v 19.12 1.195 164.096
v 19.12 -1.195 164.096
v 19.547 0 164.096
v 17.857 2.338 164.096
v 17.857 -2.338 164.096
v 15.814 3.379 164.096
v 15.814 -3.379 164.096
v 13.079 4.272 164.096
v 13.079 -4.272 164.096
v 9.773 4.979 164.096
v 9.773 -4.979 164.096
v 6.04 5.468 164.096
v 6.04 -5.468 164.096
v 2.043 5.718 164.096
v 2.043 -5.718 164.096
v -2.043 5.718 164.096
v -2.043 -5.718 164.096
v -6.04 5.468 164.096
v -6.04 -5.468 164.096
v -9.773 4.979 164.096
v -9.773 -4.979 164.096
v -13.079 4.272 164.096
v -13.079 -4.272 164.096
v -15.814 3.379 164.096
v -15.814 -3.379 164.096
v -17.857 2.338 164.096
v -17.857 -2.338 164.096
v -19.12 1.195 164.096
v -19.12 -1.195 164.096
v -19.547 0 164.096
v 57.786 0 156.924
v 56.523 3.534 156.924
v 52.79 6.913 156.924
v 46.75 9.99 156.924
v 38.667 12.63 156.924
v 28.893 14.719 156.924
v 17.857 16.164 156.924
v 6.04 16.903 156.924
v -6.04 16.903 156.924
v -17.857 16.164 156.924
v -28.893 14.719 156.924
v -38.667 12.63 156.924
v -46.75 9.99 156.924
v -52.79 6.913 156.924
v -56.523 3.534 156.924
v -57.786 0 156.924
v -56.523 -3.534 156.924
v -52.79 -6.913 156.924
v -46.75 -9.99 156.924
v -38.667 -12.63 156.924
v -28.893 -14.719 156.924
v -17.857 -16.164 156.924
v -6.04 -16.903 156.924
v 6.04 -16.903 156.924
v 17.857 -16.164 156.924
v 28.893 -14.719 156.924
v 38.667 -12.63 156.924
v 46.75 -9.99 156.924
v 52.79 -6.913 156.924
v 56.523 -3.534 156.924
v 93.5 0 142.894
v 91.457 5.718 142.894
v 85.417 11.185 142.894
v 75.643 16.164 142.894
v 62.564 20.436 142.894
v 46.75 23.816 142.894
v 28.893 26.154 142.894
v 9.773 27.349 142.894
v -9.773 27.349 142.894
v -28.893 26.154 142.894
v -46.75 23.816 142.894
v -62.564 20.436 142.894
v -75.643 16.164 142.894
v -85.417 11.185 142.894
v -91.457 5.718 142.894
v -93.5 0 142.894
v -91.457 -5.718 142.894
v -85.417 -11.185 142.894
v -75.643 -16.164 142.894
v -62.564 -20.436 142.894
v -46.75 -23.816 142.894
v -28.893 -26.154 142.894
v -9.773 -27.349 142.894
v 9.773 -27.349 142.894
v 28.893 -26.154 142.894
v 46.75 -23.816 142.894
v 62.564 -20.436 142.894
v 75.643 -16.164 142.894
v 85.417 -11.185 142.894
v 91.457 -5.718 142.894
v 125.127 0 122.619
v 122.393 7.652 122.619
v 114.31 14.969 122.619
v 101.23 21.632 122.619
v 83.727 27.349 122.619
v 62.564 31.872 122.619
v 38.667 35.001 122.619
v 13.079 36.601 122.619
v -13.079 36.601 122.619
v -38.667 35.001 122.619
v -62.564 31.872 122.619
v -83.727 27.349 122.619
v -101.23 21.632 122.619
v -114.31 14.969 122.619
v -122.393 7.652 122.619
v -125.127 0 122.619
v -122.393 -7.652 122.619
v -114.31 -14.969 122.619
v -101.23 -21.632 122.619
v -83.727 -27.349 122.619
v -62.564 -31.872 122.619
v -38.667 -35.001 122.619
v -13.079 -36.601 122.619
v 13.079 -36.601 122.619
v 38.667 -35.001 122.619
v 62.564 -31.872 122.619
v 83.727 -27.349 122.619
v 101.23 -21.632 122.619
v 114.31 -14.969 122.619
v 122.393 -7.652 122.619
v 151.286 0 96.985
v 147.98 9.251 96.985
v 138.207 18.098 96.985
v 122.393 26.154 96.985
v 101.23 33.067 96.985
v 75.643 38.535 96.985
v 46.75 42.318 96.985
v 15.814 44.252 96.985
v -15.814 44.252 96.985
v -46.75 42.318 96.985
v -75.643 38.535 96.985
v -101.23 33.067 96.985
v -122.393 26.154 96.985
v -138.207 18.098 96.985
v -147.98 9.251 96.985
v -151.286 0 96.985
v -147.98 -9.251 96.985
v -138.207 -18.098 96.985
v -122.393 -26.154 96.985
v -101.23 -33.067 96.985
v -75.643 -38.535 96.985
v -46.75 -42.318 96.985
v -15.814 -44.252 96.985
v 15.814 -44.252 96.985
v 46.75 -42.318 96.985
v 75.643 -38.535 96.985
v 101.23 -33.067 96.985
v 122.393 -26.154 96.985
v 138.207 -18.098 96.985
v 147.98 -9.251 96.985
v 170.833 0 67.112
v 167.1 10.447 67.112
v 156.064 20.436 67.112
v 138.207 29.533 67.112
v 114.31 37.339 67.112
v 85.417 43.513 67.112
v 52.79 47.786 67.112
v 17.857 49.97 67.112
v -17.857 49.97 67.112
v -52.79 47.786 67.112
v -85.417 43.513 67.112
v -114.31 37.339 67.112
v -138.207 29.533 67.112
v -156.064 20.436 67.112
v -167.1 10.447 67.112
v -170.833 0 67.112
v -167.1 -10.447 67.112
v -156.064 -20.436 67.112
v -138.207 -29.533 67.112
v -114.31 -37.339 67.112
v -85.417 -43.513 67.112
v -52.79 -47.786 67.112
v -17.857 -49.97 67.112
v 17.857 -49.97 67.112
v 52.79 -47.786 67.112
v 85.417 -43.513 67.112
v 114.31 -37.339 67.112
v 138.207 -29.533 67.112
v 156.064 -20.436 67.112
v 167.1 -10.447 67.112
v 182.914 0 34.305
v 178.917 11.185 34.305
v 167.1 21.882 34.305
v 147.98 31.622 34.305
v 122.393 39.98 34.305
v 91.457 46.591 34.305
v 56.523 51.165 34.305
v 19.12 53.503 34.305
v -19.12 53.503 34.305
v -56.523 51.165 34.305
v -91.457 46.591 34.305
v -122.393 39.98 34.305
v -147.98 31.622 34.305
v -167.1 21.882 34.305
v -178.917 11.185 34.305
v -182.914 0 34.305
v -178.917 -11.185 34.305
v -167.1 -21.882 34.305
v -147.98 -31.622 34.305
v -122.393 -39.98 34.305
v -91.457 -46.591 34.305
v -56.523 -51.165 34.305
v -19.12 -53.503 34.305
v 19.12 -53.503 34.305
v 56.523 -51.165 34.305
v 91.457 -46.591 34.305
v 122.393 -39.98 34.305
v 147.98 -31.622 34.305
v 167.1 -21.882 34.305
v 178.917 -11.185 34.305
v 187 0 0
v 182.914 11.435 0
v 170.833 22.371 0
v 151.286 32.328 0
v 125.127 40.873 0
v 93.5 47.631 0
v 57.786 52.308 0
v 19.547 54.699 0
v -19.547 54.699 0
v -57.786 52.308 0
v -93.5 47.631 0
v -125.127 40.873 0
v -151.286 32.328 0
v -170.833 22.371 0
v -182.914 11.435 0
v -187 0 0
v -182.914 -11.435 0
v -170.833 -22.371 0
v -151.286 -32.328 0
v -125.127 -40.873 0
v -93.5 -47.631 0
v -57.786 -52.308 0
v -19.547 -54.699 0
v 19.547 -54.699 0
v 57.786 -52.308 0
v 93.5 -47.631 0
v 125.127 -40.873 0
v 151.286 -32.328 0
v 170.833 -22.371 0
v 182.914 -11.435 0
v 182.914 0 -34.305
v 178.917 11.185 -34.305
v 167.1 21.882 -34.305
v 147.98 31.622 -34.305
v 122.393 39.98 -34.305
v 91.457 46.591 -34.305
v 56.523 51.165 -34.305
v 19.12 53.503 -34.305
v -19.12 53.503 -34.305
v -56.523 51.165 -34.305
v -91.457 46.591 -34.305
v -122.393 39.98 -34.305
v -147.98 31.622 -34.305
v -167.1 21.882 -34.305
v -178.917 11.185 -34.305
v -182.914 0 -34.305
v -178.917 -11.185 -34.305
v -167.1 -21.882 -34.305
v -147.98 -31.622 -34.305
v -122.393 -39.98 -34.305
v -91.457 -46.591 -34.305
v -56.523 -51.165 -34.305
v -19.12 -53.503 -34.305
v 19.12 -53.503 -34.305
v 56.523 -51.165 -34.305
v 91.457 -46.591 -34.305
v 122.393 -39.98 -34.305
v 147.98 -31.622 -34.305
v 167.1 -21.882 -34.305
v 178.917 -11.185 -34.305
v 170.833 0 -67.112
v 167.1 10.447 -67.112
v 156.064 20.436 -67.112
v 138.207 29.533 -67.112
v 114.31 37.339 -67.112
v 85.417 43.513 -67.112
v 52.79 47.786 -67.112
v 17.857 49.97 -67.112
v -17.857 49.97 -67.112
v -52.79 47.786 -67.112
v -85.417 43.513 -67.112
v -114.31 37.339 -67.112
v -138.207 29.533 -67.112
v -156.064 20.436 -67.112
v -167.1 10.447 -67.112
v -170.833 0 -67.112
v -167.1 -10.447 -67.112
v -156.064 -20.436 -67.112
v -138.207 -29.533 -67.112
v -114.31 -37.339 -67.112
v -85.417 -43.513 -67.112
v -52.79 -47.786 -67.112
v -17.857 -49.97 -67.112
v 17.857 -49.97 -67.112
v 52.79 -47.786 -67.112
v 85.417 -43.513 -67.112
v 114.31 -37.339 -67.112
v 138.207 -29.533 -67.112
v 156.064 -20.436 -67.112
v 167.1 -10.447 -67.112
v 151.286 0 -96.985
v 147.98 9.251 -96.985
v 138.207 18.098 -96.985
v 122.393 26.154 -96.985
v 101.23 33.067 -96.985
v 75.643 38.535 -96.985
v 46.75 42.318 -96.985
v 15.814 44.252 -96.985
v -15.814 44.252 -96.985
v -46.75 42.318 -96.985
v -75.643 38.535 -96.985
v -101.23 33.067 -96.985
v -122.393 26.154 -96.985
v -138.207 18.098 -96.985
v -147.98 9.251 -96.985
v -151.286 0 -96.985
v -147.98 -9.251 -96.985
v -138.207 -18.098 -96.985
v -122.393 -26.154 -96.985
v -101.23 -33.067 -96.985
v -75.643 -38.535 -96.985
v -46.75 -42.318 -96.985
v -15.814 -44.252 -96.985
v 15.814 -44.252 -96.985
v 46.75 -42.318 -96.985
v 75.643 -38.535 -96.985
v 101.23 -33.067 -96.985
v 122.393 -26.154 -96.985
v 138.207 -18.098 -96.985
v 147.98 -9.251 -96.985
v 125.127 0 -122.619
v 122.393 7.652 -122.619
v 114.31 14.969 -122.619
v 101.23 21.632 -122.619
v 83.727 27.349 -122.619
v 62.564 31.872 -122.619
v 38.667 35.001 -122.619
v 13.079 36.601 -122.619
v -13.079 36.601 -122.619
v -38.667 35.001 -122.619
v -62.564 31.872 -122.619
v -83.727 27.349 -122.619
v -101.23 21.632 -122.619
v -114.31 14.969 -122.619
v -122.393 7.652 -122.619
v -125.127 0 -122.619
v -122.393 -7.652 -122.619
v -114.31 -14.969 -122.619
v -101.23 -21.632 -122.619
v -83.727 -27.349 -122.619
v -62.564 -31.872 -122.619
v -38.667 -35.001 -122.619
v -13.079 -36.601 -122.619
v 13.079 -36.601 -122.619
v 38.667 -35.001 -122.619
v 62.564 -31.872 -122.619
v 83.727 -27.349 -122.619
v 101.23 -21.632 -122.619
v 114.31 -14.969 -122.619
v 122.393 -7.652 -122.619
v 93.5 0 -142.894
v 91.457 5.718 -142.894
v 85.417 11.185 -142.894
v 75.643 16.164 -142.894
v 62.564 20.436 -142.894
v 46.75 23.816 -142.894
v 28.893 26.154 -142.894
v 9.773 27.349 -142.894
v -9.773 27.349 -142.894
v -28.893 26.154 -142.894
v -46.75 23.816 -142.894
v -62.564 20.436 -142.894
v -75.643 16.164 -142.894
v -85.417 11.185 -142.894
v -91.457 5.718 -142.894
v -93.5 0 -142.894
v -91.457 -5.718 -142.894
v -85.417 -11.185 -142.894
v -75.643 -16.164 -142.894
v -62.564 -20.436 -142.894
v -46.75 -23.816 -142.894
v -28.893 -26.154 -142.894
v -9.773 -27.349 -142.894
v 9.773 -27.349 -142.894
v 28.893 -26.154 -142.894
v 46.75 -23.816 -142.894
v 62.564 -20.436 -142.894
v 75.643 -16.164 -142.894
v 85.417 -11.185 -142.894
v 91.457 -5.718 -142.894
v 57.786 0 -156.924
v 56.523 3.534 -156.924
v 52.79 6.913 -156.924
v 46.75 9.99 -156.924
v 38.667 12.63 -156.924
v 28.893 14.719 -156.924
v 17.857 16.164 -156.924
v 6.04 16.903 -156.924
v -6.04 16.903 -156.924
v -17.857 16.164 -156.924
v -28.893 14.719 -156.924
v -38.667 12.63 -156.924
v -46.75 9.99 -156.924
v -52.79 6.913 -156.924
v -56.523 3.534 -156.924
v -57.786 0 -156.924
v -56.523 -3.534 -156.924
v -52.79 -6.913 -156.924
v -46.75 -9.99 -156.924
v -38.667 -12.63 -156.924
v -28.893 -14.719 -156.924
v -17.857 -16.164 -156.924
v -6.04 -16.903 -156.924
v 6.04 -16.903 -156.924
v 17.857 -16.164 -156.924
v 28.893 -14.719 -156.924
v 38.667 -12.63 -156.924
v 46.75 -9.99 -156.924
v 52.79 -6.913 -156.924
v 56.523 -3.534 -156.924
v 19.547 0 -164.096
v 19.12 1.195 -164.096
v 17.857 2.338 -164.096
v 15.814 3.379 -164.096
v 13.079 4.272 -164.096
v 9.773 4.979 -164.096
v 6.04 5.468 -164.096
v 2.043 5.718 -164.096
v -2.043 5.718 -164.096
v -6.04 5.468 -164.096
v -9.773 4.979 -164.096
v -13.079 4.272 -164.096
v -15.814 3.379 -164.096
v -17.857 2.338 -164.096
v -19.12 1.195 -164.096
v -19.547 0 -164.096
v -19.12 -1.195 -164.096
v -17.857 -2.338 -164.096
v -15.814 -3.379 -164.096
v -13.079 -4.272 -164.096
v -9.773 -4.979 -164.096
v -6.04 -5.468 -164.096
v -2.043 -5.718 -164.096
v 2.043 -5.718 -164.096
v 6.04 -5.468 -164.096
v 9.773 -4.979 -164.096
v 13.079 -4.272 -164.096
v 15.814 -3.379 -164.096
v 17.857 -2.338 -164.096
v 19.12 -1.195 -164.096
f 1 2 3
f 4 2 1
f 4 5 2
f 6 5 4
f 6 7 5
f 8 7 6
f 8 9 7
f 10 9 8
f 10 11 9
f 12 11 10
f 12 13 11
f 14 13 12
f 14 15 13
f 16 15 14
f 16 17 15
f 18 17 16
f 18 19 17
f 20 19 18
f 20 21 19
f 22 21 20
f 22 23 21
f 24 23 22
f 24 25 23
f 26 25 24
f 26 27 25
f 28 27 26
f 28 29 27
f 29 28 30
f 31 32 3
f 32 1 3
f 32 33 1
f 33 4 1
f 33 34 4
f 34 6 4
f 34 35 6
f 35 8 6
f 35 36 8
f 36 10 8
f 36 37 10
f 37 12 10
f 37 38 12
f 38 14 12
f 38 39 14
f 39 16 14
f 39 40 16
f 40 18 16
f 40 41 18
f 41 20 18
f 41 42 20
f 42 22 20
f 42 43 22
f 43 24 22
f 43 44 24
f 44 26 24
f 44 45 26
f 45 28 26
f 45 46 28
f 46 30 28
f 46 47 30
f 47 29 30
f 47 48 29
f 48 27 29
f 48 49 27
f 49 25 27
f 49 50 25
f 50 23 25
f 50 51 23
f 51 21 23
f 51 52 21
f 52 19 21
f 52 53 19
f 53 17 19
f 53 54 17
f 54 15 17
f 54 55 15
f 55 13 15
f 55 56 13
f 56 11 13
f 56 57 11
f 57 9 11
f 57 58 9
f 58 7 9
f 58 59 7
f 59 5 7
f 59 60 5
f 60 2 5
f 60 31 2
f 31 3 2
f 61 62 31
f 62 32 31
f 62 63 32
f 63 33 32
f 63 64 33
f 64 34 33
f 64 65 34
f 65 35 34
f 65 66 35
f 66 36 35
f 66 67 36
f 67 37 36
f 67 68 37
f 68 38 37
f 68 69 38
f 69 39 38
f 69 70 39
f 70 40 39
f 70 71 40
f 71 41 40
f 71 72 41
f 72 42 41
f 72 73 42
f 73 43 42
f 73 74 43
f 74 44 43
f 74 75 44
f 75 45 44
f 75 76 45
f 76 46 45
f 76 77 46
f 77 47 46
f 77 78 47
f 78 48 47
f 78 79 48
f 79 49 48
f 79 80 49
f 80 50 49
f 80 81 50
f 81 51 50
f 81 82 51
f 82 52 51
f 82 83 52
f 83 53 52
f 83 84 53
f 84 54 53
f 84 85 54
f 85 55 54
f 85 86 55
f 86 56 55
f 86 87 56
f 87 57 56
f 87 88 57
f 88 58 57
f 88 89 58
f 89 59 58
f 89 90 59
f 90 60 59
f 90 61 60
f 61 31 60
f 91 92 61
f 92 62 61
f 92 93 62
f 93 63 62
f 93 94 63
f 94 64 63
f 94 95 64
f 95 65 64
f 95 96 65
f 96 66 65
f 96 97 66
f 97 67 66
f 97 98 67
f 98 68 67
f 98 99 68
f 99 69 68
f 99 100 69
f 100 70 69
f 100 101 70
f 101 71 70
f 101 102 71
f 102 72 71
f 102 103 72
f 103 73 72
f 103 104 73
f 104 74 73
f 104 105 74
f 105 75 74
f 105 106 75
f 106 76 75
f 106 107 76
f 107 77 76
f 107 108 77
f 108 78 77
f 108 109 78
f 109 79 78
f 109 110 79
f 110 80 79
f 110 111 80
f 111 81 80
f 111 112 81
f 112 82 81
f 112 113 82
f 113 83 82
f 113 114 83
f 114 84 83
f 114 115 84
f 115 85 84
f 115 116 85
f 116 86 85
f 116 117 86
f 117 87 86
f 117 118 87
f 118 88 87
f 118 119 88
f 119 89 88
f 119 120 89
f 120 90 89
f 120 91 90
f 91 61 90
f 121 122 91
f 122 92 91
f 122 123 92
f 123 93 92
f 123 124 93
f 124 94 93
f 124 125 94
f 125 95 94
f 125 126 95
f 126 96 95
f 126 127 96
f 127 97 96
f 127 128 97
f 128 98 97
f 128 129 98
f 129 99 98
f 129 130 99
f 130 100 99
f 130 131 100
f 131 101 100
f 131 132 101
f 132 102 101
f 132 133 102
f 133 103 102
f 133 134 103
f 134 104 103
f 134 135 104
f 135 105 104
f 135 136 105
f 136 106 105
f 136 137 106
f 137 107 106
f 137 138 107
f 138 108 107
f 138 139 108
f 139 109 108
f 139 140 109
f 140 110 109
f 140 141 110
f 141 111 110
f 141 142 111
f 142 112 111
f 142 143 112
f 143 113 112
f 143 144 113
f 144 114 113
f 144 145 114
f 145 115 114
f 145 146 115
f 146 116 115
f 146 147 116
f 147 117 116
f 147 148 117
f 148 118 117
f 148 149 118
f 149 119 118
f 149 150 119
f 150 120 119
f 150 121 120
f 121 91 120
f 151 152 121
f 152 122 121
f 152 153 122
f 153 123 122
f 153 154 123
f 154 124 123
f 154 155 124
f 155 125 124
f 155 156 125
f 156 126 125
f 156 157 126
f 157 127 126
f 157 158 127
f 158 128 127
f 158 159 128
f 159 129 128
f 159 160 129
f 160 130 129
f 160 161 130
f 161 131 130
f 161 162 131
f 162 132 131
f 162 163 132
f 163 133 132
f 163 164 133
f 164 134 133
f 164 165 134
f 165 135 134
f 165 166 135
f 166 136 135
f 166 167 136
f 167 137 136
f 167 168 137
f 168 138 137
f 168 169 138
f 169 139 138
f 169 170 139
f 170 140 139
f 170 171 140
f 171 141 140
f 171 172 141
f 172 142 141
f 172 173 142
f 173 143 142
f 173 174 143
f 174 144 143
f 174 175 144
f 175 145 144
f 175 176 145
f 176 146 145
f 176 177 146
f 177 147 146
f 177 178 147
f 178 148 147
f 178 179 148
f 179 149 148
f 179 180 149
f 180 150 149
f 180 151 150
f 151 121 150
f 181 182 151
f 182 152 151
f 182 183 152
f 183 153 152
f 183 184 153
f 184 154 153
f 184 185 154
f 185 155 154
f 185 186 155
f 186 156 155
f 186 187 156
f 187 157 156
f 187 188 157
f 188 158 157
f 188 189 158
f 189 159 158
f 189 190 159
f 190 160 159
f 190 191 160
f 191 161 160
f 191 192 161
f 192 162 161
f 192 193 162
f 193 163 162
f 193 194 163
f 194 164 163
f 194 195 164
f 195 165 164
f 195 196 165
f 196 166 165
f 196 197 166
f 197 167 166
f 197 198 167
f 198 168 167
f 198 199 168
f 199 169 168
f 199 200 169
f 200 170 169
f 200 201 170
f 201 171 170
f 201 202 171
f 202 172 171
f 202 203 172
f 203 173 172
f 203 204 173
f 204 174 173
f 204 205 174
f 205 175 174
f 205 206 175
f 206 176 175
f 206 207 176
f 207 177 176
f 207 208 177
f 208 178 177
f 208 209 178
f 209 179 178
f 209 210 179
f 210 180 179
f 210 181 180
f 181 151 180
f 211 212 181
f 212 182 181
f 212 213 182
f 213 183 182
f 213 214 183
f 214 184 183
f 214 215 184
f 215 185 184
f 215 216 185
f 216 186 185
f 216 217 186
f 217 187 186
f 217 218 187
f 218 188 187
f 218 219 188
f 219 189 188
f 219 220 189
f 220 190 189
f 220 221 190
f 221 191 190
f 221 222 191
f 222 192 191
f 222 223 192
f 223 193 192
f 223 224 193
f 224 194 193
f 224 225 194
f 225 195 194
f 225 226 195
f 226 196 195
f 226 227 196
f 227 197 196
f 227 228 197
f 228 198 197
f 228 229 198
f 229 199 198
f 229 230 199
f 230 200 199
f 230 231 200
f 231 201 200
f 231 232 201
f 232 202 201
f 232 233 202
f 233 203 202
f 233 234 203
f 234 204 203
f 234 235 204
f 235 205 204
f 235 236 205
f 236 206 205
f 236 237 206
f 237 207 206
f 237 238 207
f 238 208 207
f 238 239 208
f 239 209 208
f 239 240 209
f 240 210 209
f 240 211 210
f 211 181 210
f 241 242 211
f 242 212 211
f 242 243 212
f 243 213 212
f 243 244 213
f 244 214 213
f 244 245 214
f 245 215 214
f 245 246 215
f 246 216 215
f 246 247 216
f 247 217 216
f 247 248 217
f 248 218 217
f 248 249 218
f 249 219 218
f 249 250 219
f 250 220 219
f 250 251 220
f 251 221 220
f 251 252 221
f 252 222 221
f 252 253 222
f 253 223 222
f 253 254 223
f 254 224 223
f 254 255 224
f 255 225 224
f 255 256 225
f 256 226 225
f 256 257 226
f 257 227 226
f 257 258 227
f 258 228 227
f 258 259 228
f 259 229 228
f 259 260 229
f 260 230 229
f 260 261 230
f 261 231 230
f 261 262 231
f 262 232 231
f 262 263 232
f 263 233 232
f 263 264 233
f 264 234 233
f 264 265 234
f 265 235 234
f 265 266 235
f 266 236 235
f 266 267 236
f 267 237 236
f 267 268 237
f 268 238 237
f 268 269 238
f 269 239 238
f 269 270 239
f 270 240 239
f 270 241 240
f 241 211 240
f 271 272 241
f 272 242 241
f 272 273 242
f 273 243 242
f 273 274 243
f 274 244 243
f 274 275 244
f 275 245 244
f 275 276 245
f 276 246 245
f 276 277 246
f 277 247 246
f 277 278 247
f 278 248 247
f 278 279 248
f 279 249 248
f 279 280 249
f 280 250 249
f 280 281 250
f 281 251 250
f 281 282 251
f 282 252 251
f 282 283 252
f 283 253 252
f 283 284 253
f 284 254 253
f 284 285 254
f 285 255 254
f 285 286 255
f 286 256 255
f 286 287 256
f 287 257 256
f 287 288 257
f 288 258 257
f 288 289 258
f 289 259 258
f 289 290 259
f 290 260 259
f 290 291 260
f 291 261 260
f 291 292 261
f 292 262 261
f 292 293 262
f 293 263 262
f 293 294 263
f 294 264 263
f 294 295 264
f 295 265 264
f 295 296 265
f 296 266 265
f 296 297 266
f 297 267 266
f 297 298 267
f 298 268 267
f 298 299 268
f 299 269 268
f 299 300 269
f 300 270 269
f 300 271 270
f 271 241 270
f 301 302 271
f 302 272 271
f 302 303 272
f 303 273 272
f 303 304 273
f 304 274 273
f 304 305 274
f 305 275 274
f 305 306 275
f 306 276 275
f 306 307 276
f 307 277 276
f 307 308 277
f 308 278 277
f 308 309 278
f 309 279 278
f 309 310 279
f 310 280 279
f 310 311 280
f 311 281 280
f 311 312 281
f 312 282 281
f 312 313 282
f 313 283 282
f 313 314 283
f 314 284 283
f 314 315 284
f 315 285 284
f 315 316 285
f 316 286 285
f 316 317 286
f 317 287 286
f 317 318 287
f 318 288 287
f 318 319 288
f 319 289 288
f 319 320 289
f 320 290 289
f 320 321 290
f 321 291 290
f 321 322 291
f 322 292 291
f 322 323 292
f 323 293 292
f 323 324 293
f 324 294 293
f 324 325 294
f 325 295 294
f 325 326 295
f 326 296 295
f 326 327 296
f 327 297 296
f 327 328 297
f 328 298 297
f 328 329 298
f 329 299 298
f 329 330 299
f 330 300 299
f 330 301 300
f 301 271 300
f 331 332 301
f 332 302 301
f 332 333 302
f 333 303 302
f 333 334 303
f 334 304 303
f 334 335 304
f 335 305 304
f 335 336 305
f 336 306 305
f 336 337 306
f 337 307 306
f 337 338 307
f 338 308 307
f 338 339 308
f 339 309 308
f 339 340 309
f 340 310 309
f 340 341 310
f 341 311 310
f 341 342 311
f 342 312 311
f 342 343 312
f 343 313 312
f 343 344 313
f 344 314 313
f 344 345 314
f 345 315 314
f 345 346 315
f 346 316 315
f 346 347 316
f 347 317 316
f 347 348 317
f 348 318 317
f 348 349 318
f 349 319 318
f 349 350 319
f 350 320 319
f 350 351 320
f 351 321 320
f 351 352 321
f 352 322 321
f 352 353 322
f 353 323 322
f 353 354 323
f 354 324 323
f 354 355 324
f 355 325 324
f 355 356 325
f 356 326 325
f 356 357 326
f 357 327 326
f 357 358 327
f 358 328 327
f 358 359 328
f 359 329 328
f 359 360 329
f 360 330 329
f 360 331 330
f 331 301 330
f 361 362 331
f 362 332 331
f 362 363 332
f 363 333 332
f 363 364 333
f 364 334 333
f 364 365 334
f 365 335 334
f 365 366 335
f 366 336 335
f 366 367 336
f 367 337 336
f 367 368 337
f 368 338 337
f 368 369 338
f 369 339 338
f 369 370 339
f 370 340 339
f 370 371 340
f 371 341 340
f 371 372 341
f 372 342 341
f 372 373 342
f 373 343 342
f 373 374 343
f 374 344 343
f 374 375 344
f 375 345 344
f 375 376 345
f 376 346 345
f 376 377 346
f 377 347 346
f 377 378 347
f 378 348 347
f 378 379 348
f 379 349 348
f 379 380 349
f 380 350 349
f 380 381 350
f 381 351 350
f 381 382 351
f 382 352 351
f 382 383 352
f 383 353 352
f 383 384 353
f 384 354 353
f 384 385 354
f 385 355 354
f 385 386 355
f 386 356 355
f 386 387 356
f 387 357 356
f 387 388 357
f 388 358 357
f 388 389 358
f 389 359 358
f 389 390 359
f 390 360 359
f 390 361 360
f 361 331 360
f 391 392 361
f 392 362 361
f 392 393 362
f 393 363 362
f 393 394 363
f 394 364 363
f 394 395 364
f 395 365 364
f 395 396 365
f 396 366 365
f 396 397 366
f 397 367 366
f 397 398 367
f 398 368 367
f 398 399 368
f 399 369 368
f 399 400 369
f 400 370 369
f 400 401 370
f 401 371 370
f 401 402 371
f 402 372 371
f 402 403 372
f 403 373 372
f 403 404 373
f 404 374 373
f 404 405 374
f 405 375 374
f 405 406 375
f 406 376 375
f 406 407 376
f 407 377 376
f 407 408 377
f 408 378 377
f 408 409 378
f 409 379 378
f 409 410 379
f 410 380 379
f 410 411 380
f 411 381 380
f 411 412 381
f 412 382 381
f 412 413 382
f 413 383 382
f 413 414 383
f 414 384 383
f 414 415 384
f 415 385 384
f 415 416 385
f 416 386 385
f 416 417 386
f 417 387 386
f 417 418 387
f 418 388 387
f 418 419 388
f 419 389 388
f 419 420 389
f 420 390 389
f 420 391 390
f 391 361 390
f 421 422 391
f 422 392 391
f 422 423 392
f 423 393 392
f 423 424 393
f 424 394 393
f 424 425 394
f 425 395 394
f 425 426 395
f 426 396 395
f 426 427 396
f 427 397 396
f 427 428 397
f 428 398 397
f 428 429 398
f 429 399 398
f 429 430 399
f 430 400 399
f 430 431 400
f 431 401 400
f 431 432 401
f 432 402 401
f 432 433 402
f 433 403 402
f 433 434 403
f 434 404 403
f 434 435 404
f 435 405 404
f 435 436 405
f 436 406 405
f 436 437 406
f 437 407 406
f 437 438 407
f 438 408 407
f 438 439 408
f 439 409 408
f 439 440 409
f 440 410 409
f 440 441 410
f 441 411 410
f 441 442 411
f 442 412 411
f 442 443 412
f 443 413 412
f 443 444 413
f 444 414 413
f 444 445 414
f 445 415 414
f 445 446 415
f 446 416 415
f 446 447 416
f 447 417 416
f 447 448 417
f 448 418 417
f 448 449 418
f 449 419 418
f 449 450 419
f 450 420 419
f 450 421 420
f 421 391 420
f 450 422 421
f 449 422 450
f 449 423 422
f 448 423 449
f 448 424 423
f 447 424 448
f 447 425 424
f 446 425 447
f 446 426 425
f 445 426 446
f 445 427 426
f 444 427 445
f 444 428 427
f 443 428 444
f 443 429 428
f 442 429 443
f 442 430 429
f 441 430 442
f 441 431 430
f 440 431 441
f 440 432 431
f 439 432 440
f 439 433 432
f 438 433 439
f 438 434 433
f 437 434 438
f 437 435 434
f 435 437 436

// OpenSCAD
// Generated by SolidPython 1.0.1 on 2020-07-29 00:46:52


scale(v = [17, 5, 15]) {
	sphere(r = 11);
}
/***********************************************
*********      SolidPython code:      **********
************************************************
 
# import packages: SolidPython
from solid import *
from solid.utils import *
from itertools import chain, combinations, permutations


class Resize:

    def __init__(self, scad_file):
        self.scad_file = scad_file
        #self.scad_file = import_scad(scad_file)
        # cone/cylinder param:
        self.r1 = 0
        self.r2 = 0
        self.h = 0
        # rectangular prism param:
        self.w = 0
        self.l = 0
        # ellipse param:
        self.r = 0

    # import OpenScad code (file name corresponds to shape)


    # classify shape + parameters
    def assign(self, param1, param2, param3):
        if self.scad_file == 'cone.scad':
            self.r1 = param1
            self.r2 = param2
            self.h = param3
        elif self.scad_file == 'cylinder.scad':
            self.r1 = param1
            self.r2 = param2
            self.h = param3
        elif self.scad_file == 'rectangularPrism.scad':
            self.h = param1
            self.l = param2
            self.w = param3
        else:
            self.r = param1
            self.h = param2

    # resize parameters
    def iterate(self):
        x = range(3, 20, 2)
        i = 1
        if self.scad_file == 'cone.scad':
            tempList = list(permutations(x, 2))
            for temp in tempList:
                param1 = temp[0]
                param2 = temp[1]
                filepath = 'produced_scad_files/' + 'cone' + str(param1) + '_' + str(param2) + '_' + '.scad'
                scad_render_to_file(cylinder(h=param1, r1=param2, r2=0), filepath)

        elif self.scad_file == 'cylinder.scad':
            tempList = list(permutations(x, 3))
            for temp in tempList:
                param1 = temp[0]
                param2 = temp[1]
                filepath = 'produced_scad_files/' + 'cylinder' + str(param1) + '_' + str(param2) + '_' + '.scad'
                scad_render_to_file(cylinder(h=param1, r1=param2, r2=param2), filepath)

        elif self.scad_file == 'rectangularPrism.scad':
            tempList = list(permutations(x, 3))
            for temp in tempList:
                param1 = temp[0]
                param2 = temp[1]
                param3 = temp[2]
                filepath = 'produced_scad_files/' + 'rectangularPrism' + str(param1) + '_' + str(param2) + '_' + str(
                    param3) + '.scad'
                scad_render_to_file(cube(size=(param1, param2, param3)), filepath)

        elif self.scad_file == 'ellipse.scad':
            tempList = list(permutations(x, 4))
            for temp in tempList:
                param1 = temp[0]
                param2 = temp[1]
                param3 = temp[2]
                param4 = temp[3]
                filepath = 'produced_scad_files/' + 'ellipse' + str(param1) + '_' + str(param2) + '_' + str(param3) + '_' + str(param4) + '.scad'
                scad_render_to_file(scale([param1, param2, param3])(sphere(r=param4)), filepath)

    def render_to_scadfile(self):
        scad_render_to_file(scad, 'example.scad') 
 
************************************************/
